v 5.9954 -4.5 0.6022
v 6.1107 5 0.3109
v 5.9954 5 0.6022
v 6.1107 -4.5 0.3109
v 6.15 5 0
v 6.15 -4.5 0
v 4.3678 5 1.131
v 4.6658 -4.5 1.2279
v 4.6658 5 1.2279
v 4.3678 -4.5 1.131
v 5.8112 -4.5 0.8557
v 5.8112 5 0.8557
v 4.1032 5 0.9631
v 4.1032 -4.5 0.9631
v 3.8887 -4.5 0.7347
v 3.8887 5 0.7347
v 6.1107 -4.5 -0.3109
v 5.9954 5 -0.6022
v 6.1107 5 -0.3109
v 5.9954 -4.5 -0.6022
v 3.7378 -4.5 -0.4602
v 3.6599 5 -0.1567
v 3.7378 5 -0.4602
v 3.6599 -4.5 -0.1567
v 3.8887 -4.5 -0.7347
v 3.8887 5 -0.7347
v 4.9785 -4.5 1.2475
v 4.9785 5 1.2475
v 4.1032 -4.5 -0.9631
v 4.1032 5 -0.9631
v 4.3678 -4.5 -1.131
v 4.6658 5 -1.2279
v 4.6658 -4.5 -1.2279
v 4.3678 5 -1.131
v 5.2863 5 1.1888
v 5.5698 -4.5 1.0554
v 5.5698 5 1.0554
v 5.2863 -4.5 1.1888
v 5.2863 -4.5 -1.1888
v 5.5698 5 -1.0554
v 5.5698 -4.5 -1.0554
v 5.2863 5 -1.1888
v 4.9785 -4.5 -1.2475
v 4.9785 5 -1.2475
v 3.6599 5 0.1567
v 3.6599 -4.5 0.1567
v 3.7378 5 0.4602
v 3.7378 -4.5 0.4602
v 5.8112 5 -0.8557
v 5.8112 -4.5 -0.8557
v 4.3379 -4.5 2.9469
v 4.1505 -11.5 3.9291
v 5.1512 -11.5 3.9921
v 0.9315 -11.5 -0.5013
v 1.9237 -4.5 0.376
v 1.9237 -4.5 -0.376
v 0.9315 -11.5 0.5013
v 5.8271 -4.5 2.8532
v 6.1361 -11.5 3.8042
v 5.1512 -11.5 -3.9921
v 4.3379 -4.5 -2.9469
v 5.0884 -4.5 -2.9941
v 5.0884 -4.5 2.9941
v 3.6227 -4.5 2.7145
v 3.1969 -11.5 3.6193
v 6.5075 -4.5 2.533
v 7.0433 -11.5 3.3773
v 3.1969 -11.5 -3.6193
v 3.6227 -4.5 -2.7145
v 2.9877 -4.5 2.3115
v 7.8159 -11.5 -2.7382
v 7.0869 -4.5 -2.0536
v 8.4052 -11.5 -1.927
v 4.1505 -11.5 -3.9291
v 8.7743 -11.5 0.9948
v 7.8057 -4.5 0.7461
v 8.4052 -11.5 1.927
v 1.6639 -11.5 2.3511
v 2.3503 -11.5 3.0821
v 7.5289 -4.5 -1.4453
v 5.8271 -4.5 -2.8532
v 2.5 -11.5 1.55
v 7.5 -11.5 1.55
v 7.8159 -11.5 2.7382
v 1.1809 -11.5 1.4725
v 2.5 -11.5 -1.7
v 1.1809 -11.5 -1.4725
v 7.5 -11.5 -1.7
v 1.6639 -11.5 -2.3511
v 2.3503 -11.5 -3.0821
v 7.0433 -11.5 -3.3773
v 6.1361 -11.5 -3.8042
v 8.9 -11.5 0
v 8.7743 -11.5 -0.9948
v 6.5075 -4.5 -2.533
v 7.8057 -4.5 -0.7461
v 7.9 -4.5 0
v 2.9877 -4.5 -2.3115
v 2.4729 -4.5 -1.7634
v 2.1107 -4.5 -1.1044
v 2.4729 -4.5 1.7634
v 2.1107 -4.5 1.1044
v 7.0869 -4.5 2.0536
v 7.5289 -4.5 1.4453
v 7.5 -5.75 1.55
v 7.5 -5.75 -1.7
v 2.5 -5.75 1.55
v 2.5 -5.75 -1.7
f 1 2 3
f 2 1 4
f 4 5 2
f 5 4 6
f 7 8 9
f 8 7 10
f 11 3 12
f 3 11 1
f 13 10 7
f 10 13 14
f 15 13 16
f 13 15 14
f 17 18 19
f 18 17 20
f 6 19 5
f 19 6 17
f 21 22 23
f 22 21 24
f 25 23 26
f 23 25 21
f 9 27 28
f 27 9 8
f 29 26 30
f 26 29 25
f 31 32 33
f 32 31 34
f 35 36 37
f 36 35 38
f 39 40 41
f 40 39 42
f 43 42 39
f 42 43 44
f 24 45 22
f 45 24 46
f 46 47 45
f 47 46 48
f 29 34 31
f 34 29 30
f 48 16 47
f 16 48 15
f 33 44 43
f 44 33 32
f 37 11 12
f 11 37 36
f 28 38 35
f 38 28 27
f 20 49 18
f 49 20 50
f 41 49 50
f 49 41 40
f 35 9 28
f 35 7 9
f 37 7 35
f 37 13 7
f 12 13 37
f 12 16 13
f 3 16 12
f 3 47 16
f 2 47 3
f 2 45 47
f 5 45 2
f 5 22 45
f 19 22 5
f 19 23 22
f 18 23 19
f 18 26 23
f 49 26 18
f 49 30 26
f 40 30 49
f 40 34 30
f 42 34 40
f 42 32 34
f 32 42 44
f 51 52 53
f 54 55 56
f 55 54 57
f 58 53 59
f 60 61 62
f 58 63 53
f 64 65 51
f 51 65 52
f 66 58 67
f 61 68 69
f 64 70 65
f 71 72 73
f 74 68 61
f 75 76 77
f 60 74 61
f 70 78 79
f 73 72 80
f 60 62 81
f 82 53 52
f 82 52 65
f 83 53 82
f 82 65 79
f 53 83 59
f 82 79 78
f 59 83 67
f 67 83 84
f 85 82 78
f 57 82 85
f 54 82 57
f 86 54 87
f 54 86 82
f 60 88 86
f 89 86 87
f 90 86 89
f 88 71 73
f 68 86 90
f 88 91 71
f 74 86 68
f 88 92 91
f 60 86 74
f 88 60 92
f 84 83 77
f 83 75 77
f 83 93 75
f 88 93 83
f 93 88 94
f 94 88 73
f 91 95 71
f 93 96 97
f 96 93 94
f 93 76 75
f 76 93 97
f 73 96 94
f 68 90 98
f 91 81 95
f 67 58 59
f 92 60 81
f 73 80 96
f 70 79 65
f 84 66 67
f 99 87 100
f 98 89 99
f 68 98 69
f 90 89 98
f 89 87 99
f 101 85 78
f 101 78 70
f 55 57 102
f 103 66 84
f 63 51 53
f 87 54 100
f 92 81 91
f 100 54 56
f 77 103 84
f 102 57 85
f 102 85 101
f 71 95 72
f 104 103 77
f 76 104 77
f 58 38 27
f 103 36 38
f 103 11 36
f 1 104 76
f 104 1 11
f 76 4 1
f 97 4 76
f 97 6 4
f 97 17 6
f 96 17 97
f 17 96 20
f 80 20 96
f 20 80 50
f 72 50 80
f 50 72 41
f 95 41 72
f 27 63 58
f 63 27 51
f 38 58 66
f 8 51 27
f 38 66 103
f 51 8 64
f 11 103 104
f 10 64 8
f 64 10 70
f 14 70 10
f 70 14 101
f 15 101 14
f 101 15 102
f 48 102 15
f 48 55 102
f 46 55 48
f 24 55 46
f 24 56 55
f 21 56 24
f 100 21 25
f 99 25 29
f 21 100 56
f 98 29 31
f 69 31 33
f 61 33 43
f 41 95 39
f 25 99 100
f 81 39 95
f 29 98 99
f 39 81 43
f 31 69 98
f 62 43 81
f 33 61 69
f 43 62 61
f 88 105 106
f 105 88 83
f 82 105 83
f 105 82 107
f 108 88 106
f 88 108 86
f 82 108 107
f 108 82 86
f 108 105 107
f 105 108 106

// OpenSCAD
// file: modules/StepMotor_28BYJ.scad
translate([0,-30,0])
StepMotor28BYJ();

translate([0,30,0])
StepMotor28BYJ();


module StepMotor28BYJ() {
  difference() {
    union(){
      color("gray") cylinder(h = 19, r = 14, center = true, $fn = 32);
      color("gray") translate([8,0,-1.5])	cylinder(h = 19, r = 4.5, center = true, $fn = 32);
      color("gold",.75) translate([8,0,-10])	cylinder(h = 19, r = 2.5, center = true, $fn = 32);

      color("Silver") translate([0,0,-9]) cube([7,35,0.99], center = true);				
      color("Silver") translate([0,17.6,-9])	cylinder(h = 1, r = 3.5, center = true, $fn = 32);

      color("Silver") translate([0,-17.6,-9])	cylinder(h = 1, r = 3.5, center = true, $fn = 32);

      color("blue") translate([-3,0,-1]) cube([28,14.6,16.9], center = true);
      color("blue") translate([-2,0,0])  cube([24.5,16,15], center = true);
    }

    // handle
    color("red") translate([11,0,-16.55]) cube([4,5,6.1], center = true);
    color("red") translate([5,0,-16.55]) cube([4,5,6.1], center = true);

    // screw holes
    color("red") translate([0,17.5,-9])	cylinder(h = 2, r = 2, center = true, $fn = 32);
    color("red") translate([0,-17.5,-9])	cylinder(h = 2, r = 2, center = true, $fn = 32);
  }
}
// main file
use <modules/StepMotor_28BYJ.scad>;

module shaft(dia) {
  difference() {
    color("green",.5) union () {
      //TODO: Parametrize this .9 magic number
      translate([dia/2+.9,5,0]) rotate([90,0,0]) cylinder(10,1.25,1.25,$fn=25);
      translate([dia/2+.9,-4.5,0]) rotate([90,0,0]) cylinder(7,3,4,$fn=25);
    }
    color("Orange") translate([2.5,-12,-1.70]) cube([5,6.25,3.25]);
  }
}

shaft(8);
//%translate([4.90,-25,-8]) rotate([90,270,0]) StepMotor28BYJ();
